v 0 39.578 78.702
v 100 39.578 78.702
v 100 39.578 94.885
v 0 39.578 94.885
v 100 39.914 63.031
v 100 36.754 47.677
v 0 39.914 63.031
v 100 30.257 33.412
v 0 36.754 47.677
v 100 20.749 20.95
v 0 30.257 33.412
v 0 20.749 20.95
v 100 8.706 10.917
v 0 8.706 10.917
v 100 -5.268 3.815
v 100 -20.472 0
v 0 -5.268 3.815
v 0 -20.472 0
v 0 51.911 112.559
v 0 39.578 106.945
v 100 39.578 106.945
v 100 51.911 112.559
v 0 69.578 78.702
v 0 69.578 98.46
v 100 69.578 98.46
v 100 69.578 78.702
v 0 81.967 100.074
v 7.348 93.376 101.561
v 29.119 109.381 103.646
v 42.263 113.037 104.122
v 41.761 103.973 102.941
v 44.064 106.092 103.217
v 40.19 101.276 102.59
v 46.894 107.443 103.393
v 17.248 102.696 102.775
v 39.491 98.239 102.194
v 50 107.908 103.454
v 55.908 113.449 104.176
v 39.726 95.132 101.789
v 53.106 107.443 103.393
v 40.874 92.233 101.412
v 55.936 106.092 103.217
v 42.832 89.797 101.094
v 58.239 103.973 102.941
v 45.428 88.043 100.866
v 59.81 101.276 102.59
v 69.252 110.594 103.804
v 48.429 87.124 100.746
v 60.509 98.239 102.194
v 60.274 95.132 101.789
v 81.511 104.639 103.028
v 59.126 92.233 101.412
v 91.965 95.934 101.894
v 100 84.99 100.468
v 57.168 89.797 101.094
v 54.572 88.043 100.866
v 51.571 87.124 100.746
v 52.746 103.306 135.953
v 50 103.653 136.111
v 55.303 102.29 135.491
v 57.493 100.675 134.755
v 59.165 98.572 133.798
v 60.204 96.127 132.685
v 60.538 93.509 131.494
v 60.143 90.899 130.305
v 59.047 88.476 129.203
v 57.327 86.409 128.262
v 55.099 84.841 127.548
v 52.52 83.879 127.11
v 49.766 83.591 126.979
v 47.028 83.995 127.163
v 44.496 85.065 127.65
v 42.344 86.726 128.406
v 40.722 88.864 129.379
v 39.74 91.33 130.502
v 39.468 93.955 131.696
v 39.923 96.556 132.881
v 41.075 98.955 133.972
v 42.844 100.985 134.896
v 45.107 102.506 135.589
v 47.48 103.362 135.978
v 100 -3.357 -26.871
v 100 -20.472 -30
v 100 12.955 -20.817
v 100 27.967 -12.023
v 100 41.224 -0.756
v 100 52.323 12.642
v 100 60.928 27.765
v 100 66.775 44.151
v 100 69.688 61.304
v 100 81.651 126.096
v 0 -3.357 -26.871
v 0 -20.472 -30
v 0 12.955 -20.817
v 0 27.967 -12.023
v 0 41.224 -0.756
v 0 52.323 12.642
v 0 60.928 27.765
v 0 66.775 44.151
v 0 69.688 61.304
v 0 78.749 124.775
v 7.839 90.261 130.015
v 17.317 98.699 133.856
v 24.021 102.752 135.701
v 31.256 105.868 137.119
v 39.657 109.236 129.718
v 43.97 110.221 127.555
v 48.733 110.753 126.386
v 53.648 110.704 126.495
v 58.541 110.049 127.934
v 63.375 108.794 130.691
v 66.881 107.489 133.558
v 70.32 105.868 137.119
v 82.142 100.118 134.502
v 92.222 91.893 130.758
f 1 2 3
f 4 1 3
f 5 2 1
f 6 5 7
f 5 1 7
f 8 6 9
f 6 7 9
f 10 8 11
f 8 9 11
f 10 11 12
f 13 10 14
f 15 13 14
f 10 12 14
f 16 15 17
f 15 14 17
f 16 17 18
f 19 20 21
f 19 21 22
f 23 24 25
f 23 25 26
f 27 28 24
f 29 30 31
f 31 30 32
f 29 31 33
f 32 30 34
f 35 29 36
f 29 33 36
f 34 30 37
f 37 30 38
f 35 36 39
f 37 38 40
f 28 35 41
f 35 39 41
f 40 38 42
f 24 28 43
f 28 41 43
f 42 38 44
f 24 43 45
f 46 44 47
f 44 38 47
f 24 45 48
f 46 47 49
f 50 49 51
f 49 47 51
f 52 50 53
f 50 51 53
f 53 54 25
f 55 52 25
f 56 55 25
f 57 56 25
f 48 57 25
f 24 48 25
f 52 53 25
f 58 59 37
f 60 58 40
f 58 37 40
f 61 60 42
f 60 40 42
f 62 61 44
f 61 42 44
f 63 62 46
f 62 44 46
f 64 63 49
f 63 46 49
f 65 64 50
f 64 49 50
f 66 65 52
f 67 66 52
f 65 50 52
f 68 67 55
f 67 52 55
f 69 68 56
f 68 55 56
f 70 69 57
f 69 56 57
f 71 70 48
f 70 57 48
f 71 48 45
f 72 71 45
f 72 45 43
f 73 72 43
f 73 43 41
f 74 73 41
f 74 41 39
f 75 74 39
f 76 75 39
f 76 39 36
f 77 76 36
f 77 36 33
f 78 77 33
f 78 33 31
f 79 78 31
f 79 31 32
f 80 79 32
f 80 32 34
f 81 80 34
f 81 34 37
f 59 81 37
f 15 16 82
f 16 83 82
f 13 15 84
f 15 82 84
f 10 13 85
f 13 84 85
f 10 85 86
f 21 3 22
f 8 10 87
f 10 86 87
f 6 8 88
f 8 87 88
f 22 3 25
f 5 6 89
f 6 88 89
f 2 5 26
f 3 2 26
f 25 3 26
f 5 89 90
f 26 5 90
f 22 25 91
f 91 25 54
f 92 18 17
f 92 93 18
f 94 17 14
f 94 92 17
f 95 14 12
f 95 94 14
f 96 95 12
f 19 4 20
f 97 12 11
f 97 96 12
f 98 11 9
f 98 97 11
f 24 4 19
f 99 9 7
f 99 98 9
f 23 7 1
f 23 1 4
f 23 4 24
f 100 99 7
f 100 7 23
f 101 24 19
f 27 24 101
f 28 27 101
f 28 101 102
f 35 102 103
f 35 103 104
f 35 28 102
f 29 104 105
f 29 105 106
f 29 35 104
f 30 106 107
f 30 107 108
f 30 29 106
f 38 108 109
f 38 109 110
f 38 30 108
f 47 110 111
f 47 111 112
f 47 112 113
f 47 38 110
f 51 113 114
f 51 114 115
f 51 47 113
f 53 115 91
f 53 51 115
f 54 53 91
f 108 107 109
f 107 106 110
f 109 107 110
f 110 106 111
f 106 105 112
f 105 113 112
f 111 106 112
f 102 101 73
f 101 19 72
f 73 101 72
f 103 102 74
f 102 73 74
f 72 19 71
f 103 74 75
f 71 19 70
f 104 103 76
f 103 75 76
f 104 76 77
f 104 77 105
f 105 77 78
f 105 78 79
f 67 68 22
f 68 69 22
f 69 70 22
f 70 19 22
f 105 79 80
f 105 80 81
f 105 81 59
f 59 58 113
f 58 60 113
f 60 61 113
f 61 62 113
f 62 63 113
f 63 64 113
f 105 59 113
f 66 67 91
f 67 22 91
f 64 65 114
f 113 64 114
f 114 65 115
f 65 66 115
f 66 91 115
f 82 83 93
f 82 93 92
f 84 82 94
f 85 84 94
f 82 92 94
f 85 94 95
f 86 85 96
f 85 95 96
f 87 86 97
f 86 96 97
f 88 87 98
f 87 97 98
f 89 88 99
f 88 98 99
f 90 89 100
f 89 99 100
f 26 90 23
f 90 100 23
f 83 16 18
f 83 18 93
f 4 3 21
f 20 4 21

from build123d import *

# Parameters (mm, degrees)
BOSS_EXTRUDE1_DEPTH  = 100
BOSS_EXTRUDE15_DEPTH = 100
SKETCH12_R           = 10.538298665
CUT_EXTRUDE1_DEPTH   = 100
CUT_EXTRUDE4_DEPTH   = 100


with BuildPart() as part:
    # Sketch1 → Boss-Extrude1 (new body)
    with BuildSketch(Plane(origin=(0, 0, 0), x_dir=(0, 0, -1), z_dir=(1, 0, 0))):
        with BuildLine():
            Line((0, -20.471600717), (30, -20.471600717))
            ThreePointArc((30, -20.471600717), (-5.700994218, 47.06632084), (-78.701931645, 69.578428053))
            Line((-78.701931645, 69.578428053), (-78.701931645, 39.578428053))
            ThreePointArc((-78.701931645, 39.578428053), (-26.914197654, 25.853117404), (0, -20.471600717))
        make_face()
    extrude(amount=BOSS_EXTRUDE1_DEPTH)

    # 3DSketch6 → Boss-Extrude15 (add)
    with BuildSketch(Plane(origin=(100, 39.578428053, 78.701931645), x_dir=(0, 0.7502508437816612, 0.661153288886099), z_dir=(-1, 0, 0))):
        Polygon((0, 0), (10.699765669, -12.141674792), (18.673279749, -21.189706114), (31.636766263, -17.247671387), (88.356194396, 0), (78.117236691, 33.671085949), (35.570814657, 5.010889827), (22.507525313, 19.834598667), align=None)
    extrude(amount=BOSS_EXTRUDE15_DEPTH)

    # Sketch12 → Cut-Extrude1 (cut)
    with BuildSketch(Plane(origin=(0, -11.452264846, 87.90339576), x_dir=(-1, 0, 0), z_dir=(0, 0.12919059900394475, -0.9916197805252788))):
        with Locations(Location((-50, 109.830380232, 0), (0, 0, 90))):
            Circle(SKETCH12_R)
    extrude(amount=-CUT_EXTRUDE1_DEPTH, mode=Mode.SUBTRACT)

    # Sketch13 → Cut-Extrude4 (cut)
    with BuildSketch(Plane(origin=(0, -11.452264846, 87.90339576), x_dir=(-1, 0, 0), z_dir=(0, 0.12919059900394475, -0.9916197805252788))):
        with BuildLine():
            Line((-100, 97.256951485), (-100, 133.014656874))
            Line((-100, 133.014656874), (-100, 156.830890058))
            Line((-100, 156.830890058), (0, 160.198008755))
            Line((0, 160.198008755), (0, 133.014656874))
            Line((0, 133.014656874), (0, 94.208847546))
            ThreePointArc((0, 94.208847546), (-49.07241929, 126.164299771), (-100, 97.256951485))
        make_face()
    extrude(amount=-CUT_EXTRUDE4_DEPTH, mode=Mode.SUBTRACT)


solid = part.part
